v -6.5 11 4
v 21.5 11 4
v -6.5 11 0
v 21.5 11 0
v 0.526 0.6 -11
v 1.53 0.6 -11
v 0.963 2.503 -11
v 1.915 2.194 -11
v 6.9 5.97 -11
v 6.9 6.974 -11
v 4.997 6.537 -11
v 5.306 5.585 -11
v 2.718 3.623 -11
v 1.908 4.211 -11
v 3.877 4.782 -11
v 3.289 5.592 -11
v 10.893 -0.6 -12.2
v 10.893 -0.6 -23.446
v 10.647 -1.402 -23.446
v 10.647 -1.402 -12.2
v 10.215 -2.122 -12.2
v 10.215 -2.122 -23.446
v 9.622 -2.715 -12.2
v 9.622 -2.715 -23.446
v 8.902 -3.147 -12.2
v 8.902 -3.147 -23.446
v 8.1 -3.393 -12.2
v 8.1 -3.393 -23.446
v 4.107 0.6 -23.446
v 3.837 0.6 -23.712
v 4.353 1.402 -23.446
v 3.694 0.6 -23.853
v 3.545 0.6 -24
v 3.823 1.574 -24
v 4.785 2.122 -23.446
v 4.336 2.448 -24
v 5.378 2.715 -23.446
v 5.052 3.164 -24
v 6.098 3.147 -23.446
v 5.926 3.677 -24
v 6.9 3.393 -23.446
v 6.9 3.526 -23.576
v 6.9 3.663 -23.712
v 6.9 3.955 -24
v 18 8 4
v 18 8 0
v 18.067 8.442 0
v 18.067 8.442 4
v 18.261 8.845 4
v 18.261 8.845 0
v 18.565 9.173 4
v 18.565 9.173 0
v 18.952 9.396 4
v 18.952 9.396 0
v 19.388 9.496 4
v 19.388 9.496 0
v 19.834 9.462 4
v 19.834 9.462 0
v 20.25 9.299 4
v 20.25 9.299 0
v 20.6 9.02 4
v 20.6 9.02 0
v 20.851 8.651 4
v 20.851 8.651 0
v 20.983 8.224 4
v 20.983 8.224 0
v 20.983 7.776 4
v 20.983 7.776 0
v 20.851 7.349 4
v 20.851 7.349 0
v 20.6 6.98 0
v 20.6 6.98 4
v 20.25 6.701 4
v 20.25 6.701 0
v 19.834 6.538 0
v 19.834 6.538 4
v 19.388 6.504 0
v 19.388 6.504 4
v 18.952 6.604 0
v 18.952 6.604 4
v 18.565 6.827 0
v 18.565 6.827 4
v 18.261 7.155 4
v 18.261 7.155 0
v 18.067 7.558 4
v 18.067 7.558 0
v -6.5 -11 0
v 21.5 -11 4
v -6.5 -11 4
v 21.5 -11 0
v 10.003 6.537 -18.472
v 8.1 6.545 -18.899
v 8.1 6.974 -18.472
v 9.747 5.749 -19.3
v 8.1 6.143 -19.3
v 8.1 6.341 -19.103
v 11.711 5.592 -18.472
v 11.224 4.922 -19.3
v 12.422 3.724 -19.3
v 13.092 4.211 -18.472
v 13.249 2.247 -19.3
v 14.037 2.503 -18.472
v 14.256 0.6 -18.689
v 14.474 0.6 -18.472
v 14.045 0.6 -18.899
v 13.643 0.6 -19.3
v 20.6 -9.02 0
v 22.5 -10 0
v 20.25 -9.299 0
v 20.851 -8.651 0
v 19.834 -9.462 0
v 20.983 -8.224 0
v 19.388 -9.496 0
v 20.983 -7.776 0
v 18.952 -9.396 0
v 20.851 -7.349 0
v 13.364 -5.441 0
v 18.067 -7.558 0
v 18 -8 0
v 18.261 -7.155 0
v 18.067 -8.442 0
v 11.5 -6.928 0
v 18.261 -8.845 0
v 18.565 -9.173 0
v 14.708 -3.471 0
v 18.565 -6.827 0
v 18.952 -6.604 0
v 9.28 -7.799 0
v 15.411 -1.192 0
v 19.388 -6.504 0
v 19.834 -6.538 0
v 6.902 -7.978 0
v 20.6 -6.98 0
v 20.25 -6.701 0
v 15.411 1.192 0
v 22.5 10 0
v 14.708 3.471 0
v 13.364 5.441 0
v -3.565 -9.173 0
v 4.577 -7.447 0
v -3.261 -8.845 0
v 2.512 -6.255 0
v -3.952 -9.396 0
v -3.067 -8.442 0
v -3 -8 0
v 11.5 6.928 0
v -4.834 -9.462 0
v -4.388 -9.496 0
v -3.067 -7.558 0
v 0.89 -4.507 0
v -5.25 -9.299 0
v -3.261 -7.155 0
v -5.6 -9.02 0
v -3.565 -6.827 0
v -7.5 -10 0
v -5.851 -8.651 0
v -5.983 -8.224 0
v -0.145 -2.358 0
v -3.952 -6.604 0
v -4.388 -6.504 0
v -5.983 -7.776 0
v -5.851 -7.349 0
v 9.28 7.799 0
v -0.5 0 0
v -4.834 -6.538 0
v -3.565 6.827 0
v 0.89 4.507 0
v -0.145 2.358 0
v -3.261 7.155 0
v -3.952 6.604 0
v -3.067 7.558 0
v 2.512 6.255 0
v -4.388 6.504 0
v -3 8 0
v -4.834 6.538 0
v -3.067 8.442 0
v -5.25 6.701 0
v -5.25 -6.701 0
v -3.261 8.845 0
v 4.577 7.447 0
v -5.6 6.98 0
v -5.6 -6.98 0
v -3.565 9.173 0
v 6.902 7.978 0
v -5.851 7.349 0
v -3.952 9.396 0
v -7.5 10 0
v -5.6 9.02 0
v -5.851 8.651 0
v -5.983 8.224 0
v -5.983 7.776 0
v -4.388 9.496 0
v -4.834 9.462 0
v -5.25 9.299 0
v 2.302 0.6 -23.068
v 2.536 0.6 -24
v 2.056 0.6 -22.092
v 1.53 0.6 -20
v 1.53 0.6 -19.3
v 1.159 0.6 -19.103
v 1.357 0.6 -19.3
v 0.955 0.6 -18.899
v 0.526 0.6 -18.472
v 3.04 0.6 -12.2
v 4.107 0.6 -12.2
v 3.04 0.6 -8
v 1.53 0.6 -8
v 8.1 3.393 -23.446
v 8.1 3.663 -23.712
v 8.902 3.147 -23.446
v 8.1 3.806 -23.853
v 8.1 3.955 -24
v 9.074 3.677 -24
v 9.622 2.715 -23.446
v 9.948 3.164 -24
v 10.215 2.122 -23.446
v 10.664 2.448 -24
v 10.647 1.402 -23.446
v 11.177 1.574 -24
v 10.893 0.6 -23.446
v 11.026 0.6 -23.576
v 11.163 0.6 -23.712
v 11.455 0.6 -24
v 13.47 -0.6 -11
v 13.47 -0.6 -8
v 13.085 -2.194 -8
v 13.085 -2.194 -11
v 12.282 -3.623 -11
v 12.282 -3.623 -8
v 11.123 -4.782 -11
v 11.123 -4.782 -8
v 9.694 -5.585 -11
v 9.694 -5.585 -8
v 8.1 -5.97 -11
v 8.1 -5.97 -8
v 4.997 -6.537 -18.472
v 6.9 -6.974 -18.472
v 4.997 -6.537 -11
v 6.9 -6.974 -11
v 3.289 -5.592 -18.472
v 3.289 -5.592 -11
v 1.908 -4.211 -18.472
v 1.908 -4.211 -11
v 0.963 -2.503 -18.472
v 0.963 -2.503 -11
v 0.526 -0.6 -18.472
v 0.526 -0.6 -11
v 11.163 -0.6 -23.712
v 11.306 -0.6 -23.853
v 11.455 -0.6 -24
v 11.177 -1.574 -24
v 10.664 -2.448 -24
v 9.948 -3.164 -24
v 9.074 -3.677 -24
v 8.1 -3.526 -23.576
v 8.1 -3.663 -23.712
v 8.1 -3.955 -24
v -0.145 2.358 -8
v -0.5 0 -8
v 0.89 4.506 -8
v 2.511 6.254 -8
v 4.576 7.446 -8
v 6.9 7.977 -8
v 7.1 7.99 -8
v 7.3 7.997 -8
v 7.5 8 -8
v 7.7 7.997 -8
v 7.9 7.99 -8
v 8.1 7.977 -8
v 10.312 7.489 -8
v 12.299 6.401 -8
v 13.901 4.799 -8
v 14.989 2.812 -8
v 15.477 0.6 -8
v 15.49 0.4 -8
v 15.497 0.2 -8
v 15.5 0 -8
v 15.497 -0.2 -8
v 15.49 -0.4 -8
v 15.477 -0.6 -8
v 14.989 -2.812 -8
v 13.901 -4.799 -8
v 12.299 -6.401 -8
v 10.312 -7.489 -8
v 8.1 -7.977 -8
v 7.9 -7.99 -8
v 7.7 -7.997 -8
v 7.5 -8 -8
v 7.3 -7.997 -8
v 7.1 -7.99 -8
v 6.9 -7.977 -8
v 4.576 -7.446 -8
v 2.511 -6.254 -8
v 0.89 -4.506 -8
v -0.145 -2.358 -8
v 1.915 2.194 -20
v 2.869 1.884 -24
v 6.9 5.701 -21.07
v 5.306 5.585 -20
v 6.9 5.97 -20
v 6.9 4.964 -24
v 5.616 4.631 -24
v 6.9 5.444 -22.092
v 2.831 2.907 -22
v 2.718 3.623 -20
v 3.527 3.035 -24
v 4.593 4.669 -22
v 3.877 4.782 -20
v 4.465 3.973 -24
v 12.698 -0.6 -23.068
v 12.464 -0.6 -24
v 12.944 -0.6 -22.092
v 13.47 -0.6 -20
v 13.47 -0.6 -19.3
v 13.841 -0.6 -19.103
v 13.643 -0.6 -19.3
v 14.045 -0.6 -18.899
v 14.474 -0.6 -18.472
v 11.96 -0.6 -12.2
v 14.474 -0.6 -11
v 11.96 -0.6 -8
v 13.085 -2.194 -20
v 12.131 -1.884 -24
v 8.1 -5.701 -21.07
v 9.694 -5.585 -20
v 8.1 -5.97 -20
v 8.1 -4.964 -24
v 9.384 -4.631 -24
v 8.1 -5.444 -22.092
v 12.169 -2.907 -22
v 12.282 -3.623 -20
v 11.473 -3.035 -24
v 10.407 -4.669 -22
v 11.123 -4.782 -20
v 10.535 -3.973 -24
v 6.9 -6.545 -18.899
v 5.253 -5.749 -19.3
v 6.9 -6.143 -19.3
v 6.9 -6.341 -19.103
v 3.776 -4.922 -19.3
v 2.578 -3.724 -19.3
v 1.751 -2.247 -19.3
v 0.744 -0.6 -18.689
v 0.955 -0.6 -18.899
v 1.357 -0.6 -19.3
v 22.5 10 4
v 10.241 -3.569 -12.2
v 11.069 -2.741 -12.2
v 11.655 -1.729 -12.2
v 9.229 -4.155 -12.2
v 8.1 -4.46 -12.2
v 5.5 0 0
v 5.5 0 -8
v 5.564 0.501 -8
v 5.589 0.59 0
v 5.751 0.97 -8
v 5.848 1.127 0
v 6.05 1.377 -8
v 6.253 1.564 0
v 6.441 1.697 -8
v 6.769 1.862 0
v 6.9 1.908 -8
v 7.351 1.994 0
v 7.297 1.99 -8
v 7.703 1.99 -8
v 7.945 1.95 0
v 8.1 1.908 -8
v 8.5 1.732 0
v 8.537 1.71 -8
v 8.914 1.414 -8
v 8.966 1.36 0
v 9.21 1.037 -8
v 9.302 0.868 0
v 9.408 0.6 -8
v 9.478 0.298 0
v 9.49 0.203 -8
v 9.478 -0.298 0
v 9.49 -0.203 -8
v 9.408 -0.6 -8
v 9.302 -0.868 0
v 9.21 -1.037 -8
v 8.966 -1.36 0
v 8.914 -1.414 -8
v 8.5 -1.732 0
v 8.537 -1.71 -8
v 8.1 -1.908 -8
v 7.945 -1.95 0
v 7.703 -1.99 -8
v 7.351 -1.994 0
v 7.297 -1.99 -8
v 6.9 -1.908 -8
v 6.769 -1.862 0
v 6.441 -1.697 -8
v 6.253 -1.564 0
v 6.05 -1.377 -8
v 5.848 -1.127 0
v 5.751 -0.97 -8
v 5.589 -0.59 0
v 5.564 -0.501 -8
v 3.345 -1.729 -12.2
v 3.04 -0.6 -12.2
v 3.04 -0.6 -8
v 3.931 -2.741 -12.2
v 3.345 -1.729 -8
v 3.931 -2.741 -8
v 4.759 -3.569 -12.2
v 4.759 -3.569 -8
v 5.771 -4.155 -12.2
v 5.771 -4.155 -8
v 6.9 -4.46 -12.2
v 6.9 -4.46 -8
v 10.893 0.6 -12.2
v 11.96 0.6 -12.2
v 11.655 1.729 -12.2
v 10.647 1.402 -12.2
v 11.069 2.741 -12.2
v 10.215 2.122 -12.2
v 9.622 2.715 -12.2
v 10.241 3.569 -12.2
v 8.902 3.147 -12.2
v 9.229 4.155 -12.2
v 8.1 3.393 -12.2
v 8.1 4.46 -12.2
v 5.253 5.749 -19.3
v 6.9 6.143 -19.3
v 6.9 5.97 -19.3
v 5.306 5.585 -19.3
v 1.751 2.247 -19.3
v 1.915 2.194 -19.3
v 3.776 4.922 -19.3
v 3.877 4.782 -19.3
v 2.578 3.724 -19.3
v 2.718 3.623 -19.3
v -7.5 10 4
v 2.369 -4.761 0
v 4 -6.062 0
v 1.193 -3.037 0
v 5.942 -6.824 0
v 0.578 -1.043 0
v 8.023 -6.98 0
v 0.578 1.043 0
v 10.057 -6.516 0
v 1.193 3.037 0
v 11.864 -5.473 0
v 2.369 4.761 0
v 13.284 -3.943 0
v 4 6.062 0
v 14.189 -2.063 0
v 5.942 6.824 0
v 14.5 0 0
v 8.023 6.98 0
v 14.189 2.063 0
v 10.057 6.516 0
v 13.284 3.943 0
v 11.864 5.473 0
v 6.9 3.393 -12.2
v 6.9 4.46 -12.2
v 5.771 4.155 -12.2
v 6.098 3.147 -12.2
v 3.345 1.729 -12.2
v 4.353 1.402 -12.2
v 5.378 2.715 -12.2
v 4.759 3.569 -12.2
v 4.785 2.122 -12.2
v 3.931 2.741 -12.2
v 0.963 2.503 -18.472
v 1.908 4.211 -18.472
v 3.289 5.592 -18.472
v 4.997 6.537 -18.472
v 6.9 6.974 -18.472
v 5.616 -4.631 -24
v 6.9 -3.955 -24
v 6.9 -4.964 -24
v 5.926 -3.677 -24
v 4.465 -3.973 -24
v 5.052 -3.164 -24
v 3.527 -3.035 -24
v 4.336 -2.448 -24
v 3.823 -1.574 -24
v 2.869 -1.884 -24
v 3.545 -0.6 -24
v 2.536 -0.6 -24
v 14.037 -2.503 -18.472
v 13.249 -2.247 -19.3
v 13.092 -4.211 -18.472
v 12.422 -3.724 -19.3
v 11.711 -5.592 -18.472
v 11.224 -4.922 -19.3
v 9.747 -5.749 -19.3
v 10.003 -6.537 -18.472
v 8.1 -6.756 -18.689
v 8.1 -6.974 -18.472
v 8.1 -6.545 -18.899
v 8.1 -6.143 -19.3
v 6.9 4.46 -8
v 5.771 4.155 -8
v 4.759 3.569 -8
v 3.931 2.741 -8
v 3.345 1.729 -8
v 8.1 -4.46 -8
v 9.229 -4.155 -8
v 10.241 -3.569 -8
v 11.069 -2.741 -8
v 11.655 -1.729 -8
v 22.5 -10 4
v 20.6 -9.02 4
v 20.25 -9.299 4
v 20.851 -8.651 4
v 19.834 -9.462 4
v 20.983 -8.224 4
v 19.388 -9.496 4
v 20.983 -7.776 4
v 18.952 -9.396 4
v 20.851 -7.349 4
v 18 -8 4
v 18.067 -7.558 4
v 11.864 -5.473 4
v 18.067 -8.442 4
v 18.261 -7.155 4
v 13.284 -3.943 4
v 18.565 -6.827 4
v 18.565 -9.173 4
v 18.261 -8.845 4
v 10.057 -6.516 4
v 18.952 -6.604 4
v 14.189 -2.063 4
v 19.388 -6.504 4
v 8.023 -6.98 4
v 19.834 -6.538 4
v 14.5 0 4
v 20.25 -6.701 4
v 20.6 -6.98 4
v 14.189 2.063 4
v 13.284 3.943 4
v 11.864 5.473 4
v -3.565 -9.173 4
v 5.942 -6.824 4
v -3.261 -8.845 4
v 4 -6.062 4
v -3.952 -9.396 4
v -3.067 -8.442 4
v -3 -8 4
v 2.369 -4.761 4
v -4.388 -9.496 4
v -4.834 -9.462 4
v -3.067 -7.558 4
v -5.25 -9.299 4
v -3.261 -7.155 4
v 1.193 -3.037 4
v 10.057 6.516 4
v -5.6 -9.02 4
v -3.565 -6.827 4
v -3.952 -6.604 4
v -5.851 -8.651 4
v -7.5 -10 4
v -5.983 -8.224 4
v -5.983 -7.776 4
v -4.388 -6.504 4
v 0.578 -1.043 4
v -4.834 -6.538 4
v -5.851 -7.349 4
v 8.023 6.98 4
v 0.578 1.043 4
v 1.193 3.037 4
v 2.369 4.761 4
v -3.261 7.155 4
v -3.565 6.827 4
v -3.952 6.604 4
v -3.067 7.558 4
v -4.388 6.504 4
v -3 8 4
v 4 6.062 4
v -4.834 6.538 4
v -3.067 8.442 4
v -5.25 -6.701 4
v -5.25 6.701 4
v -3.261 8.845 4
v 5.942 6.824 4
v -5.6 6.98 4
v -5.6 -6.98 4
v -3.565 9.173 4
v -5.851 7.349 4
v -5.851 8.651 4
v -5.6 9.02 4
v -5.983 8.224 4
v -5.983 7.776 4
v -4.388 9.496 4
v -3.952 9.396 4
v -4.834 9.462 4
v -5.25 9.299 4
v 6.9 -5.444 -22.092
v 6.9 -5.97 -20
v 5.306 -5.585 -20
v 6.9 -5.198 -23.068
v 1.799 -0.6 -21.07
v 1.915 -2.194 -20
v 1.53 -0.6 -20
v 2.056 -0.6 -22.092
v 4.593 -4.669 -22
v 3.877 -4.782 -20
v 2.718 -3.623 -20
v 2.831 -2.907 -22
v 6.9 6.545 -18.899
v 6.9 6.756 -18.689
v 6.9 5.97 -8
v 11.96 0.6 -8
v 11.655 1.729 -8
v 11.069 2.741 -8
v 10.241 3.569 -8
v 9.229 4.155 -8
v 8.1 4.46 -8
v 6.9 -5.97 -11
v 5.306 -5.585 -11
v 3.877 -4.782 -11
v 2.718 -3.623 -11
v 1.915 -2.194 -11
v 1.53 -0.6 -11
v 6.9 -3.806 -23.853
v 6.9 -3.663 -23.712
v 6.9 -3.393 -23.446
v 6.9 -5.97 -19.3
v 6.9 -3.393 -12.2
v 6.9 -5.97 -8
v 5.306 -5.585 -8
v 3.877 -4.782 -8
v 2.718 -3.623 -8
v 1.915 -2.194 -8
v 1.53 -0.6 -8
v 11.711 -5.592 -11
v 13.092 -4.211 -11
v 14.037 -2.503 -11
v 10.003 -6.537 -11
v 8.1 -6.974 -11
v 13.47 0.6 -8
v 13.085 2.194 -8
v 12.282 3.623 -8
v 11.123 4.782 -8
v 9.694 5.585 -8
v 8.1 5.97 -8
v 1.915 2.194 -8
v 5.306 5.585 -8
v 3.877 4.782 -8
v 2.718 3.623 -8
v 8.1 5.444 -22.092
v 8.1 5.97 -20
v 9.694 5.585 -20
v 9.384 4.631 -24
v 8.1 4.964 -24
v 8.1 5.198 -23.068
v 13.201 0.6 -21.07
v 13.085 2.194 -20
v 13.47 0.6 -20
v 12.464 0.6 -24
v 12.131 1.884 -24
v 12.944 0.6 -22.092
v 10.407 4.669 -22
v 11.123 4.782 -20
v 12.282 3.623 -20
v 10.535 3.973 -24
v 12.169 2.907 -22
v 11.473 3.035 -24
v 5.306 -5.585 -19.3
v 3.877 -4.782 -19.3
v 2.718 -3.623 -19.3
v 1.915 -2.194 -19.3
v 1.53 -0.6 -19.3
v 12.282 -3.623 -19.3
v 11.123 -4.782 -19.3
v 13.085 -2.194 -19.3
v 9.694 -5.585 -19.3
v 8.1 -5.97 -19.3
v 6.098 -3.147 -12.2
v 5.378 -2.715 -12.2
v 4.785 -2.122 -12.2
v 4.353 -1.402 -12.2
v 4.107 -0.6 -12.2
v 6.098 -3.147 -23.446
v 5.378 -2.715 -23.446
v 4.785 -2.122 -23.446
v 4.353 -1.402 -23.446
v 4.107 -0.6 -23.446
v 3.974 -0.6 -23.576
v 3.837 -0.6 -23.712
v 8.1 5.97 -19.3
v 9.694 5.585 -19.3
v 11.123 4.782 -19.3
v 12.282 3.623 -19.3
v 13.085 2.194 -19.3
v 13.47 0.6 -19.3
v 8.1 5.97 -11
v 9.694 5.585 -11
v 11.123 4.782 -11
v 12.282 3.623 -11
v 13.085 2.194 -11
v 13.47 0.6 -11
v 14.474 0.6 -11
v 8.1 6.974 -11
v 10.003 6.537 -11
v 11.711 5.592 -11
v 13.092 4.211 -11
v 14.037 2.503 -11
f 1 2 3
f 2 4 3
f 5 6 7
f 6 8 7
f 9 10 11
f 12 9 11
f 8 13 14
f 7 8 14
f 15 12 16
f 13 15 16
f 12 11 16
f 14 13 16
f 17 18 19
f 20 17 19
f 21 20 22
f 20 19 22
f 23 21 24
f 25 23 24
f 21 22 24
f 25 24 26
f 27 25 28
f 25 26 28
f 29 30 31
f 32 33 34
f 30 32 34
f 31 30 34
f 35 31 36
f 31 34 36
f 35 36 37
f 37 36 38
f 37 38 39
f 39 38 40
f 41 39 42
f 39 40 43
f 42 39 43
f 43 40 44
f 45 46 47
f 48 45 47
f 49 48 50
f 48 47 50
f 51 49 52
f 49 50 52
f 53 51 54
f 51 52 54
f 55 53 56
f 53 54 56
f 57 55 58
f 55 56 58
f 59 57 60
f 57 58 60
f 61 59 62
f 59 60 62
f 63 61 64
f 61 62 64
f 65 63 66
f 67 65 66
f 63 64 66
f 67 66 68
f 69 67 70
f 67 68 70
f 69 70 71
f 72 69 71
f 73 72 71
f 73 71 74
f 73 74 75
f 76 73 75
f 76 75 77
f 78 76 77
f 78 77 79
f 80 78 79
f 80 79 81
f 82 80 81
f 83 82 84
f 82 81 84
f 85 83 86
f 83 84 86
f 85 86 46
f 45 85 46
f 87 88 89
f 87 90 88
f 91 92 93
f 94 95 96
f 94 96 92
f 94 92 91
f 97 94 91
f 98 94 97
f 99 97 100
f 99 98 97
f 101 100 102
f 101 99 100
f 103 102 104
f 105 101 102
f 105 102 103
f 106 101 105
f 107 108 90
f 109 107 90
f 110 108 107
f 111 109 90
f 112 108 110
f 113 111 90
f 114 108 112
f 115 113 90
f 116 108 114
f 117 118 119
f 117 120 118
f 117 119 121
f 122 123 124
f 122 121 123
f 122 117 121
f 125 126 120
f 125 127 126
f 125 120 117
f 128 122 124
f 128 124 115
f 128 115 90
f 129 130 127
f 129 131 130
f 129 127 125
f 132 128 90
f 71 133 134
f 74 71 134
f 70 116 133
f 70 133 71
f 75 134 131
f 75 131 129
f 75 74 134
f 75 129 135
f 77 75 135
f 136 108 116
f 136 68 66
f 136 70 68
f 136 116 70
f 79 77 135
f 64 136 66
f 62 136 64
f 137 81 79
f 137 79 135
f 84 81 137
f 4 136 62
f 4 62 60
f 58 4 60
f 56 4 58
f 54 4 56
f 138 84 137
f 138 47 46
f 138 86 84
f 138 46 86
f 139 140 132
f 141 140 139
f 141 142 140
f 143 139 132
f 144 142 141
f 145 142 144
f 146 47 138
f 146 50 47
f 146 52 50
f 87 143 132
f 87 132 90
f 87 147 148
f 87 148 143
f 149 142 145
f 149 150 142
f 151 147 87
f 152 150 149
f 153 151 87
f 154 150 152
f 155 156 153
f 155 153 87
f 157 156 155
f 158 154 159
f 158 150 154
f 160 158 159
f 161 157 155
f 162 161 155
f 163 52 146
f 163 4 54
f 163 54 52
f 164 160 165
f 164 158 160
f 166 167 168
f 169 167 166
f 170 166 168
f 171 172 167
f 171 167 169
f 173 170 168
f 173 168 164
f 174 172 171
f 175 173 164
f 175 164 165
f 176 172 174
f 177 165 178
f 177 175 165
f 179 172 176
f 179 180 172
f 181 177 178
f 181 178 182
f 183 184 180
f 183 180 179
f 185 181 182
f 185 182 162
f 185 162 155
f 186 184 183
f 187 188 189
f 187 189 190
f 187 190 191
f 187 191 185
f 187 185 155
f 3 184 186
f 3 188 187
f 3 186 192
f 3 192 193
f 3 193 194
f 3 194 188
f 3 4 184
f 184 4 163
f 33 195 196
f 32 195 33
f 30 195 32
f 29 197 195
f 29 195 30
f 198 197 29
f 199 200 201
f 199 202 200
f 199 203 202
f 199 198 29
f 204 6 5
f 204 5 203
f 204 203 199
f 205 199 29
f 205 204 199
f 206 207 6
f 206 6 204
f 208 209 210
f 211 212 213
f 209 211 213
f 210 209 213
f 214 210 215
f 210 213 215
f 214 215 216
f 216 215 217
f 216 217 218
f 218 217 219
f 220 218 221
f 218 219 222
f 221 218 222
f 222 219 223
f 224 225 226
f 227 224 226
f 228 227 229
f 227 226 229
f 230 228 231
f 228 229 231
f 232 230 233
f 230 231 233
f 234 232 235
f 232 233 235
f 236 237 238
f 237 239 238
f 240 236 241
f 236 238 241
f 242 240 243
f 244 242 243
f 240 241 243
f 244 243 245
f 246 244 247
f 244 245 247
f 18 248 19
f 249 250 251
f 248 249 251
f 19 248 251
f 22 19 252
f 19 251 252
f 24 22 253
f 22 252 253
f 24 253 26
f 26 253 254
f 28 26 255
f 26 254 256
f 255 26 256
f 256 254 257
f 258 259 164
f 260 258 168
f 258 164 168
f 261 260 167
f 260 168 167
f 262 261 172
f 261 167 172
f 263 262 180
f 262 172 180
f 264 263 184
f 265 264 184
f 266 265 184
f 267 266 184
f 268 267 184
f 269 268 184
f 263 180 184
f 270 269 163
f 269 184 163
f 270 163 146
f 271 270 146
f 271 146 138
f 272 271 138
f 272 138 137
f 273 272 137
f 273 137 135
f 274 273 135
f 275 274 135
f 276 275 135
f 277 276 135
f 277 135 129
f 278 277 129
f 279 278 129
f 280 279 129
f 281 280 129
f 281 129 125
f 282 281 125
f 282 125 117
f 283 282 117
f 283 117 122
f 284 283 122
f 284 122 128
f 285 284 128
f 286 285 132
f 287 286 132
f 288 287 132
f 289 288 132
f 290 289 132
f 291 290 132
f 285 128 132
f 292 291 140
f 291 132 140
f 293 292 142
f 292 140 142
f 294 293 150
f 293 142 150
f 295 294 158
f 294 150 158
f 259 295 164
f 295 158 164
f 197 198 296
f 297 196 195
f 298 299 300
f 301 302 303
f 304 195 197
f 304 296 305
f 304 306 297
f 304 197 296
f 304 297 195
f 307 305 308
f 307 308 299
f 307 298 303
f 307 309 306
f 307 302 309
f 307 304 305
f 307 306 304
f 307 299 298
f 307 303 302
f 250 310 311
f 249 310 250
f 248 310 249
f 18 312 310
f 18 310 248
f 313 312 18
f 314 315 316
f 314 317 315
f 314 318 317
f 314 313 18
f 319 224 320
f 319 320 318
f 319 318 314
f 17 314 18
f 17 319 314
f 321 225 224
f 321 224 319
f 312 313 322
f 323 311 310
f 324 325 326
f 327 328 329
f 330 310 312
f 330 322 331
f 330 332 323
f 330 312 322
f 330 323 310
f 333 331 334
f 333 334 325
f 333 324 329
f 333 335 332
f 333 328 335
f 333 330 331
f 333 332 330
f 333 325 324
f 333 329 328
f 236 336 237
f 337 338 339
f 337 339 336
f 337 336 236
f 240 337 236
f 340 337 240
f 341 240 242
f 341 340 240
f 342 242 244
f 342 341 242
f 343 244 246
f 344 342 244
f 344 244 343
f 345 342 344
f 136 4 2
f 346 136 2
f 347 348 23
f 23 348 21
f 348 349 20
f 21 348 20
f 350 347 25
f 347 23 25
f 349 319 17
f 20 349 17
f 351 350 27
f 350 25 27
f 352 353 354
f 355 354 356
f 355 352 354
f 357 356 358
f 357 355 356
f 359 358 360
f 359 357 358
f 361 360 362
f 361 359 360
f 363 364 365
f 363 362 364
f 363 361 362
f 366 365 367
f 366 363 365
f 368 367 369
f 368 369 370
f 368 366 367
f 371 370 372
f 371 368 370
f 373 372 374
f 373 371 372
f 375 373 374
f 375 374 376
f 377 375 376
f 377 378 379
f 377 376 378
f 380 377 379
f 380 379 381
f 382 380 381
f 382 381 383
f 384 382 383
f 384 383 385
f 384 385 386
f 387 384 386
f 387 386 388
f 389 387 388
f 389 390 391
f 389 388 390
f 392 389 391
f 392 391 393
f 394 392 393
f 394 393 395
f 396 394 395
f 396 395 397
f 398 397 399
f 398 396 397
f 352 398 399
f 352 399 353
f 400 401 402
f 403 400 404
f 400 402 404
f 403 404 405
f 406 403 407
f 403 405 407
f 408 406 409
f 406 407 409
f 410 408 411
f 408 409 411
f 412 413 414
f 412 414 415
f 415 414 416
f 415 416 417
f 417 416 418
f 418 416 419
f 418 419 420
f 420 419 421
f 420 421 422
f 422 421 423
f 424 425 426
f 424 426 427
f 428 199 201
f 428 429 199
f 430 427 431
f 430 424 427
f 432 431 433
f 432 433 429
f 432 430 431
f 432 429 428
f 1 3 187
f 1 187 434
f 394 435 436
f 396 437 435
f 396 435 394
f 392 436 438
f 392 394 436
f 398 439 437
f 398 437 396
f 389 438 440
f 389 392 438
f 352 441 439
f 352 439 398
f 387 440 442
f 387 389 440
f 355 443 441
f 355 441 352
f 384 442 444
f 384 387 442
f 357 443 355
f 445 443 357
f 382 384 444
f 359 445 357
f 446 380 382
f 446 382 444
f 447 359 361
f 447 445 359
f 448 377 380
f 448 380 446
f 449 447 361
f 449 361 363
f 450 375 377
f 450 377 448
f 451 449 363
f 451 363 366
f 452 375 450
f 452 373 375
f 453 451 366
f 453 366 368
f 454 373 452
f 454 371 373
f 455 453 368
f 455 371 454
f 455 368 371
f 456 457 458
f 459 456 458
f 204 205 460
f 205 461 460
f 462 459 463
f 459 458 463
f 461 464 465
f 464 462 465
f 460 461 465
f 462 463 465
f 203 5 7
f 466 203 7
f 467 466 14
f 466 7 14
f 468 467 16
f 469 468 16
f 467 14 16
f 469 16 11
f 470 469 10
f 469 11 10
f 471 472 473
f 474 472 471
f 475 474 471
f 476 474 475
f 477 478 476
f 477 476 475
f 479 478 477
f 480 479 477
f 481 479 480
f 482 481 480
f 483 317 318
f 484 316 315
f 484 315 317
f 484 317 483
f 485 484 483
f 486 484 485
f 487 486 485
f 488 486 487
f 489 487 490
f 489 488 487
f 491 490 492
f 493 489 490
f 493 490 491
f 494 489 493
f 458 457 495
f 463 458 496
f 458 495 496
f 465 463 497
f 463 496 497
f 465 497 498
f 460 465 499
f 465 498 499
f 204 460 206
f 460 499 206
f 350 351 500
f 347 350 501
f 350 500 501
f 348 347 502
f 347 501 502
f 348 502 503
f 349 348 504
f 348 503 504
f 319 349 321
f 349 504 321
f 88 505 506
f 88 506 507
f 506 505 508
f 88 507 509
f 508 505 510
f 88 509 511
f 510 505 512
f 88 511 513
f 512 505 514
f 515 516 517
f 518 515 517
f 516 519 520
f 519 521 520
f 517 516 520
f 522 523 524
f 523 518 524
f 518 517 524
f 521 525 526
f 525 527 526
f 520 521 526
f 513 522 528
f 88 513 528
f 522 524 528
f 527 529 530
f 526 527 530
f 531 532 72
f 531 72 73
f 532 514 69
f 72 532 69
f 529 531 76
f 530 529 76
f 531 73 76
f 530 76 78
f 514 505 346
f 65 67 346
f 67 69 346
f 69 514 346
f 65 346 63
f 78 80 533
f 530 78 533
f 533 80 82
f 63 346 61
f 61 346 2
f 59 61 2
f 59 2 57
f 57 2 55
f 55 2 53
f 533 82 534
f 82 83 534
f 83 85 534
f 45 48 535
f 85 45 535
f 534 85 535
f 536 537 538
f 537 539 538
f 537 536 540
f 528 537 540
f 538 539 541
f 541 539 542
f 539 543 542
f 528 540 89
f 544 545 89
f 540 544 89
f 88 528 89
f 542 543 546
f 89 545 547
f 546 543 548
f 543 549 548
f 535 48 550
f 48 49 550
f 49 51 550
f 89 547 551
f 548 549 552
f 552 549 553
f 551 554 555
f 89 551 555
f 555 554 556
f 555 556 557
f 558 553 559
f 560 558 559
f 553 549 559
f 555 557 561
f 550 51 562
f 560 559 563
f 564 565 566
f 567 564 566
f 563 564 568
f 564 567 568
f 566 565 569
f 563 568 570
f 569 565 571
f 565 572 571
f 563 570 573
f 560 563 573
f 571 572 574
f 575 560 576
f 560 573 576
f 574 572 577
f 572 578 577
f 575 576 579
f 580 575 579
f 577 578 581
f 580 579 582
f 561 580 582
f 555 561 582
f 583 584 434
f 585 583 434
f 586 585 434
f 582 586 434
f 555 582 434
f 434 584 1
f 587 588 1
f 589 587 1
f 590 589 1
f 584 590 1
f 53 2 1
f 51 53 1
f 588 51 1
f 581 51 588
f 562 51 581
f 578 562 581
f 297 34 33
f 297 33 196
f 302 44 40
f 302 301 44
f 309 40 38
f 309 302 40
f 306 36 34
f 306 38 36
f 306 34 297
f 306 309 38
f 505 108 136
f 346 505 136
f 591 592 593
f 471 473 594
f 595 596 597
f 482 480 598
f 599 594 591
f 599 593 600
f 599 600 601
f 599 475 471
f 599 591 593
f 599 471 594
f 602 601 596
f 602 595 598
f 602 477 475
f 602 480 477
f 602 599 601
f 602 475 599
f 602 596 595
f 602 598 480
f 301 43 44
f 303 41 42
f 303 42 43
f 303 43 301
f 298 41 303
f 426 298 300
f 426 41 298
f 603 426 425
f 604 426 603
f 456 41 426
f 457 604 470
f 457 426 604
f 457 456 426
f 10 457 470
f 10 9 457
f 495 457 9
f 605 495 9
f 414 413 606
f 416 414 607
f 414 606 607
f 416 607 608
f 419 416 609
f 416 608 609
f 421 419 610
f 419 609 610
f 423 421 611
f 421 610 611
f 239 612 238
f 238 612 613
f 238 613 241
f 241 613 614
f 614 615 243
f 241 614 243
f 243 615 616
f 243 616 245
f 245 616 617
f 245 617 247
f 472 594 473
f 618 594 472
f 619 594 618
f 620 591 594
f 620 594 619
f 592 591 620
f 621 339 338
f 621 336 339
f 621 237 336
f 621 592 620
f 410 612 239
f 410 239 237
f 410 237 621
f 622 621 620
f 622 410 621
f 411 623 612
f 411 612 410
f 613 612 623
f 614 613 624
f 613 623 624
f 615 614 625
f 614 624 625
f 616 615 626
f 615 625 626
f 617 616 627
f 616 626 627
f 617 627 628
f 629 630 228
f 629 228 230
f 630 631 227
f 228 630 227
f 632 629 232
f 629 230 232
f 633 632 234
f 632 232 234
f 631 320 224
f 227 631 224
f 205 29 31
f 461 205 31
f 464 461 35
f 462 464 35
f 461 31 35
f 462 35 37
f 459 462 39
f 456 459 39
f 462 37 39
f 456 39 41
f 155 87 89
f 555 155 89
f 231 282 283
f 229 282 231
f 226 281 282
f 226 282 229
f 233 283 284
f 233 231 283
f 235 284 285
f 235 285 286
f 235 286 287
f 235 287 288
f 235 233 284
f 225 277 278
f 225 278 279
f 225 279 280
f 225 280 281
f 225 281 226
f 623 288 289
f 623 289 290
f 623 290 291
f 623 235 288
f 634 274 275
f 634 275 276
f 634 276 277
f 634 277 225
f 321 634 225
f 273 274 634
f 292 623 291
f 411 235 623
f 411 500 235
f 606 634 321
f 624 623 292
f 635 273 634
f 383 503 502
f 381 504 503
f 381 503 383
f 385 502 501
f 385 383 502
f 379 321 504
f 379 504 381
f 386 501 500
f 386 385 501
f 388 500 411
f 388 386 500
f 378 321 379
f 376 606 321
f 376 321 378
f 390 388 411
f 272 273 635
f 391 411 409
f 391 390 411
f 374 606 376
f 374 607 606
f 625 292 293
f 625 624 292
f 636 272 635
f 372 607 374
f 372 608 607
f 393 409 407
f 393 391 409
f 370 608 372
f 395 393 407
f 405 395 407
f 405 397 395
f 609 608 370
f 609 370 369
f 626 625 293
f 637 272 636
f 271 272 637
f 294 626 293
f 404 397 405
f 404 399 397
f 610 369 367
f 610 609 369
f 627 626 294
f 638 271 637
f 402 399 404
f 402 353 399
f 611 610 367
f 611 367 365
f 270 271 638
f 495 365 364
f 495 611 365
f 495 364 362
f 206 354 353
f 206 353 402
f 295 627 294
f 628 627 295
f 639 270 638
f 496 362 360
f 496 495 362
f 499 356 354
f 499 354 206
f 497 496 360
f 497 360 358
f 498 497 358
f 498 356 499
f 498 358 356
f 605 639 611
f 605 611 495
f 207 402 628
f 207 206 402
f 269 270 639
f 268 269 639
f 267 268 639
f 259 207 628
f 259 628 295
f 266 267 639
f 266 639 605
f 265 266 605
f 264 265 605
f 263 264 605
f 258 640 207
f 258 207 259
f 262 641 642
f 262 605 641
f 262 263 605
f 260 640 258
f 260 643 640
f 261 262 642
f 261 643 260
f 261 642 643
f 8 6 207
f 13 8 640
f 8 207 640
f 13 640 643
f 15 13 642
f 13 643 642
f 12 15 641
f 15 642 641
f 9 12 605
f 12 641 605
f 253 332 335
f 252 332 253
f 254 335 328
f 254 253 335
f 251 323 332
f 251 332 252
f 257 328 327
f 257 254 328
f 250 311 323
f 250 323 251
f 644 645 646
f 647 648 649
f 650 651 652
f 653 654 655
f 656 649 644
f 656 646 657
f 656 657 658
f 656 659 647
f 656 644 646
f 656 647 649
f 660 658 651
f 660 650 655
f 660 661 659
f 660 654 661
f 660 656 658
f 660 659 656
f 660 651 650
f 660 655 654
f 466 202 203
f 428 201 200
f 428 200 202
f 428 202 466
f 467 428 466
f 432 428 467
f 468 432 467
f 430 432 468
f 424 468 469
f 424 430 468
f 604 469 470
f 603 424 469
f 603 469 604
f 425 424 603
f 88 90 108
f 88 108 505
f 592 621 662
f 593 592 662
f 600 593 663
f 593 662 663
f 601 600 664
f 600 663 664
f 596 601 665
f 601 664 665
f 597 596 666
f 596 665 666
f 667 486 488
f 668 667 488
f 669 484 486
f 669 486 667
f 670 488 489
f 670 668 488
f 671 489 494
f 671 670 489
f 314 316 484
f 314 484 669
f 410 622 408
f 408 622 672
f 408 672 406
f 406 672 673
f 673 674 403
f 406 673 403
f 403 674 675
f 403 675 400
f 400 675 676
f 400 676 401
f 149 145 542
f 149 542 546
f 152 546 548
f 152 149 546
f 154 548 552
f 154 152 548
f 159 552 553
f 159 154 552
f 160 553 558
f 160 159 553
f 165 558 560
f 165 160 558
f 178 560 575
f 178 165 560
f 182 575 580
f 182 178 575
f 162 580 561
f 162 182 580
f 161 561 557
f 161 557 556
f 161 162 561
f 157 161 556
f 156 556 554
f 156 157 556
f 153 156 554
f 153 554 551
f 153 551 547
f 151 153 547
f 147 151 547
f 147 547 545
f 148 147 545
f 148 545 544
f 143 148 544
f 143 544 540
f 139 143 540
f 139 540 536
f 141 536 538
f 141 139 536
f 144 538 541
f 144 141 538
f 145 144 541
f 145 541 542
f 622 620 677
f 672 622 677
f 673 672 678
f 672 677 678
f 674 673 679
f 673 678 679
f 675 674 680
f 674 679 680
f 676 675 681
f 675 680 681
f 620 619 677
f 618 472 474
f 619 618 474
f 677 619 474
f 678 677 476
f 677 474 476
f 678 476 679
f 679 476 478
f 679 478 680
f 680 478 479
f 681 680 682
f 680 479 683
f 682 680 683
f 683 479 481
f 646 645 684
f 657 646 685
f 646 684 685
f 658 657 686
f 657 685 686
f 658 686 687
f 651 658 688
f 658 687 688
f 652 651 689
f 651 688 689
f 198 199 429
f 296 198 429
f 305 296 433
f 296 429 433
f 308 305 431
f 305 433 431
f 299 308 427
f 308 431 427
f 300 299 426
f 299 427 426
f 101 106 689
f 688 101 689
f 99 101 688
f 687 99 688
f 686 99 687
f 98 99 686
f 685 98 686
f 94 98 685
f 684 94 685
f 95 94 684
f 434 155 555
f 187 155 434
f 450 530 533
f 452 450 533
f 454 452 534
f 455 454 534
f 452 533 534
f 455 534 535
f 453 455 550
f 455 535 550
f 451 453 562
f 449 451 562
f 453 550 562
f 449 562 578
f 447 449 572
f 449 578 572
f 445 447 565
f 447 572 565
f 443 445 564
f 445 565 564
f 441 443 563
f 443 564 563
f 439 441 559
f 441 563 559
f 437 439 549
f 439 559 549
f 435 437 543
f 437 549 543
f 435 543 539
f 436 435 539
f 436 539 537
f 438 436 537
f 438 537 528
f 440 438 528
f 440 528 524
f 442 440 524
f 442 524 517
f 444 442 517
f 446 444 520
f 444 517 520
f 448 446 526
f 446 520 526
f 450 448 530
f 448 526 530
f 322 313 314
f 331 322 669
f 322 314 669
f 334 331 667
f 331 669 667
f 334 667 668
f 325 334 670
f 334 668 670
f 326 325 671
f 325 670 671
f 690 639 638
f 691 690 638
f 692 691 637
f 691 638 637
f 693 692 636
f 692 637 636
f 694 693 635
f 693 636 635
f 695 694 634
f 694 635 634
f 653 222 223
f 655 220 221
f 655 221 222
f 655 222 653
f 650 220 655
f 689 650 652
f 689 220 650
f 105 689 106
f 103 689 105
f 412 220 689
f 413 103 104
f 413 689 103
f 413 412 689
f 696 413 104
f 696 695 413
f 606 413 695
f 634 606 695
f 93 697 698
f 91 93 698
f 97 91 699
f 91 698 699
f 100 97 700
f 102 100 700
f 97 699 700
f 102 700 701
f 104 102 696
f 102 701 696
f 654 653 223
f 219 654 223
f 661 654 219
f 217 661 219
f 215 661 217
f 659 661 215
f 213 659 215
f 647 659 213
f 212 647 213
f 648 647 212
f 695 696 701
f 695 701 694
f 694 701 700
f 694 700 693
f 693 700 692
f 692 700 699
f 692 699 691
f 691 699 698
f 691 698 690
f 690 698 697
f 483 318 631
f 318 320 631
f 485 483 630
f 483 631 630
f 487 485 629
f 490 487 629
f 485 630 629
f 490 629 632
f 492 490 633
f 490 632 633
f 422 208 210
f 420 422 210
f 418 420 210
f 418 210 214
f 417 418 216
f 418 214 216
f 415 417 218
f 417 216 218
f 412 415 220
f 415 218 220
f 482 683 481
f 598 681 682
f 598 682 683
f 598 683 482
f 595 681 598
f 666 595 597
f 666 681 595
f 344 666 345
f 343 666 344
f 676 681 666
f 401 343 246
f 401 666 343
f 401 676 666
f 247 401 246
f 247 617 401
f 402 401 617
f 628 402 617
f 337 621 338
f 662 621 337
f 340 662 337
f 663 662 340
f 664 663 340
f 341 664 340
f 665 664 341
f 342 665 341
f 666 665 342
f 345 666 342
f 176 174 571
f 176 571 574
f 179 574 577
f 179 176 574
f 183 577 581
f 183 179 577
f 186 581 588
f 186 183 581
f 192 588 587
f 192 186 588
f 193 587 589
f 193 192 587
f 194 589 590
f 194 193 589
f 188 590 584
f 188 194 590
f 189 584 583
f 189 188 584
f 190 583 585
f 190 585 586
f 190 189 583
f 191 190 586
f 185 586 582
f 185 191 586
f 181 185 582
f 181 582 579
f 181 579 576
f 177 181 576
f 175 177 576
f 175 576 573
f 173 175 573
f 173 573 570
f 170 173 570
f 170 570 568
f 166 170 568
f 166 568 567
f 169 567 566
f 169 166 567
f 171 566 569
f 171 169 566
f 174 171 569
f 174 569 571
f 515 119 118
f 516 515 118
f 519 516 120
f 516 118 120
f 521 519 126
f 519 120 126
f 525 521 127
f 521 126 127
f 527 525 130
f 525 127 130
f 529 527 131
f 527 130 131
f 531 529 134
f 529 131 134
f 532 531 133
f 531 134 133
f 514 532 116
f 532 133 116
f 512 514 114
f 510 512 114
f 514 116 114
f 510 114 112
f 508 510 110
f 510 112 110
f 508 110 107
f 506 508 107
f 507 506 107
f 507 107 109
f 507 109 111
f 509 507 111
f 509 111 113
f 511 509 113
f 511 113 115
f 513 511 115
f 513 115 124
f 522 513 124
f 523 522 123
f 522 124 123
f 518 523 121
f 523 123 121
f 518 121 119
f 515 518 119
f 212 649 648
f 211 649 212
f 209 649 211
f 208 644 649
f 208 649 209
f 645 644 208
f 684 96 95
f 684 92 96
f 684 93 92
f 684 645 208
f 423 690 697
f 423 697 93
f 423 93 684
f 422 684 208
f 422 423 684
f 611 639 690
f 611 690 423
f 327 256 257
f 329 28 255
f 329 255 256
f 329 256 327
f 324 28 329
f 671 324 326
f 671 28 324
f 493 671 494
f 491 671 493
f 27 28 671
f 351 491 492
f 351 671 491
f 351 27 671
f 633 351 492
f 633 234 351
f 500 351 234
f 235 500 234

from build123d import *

# Parameters (mm, degrees)
SKETCH_1_W                 = 15
SKETCH_1_H                 = 22
SKETCH_1_R                 = 1.5
EXTRUDE_1_DEPTH            = 4
CHAMFER_1_SIZE             = 1
CHAMFER_1_OF_MIRROR_1_SIZE = 1
SKETCH_2_R                 = 2
CUT_EXTRUDE_1_DEPTH        = 5
SKETCH_3_R                 = 8
SKETCH_3_R_2               = 2
EXTRUDE_2_DEPTH            = 8
EXTRUDE_3_DEPTH            = 16
CHAMFER_2_SIZE             = 4
CHAMFER_2_SIZE2            = 1
EXTRUDE_START              = 3
SKETCH_5_R                 = 7
SKETCH_5_R_2               = 4.5
EXTRUDE_4_DEPTH            = 8.3
CHAMFER_3_SIZE             = 0.828
SKETCH_6_R                 = 4.5
SKETCH_6_R_2               = 3.4455
EXTRUDE_5_DEPTH            = 11.8
CHAMFER_4_SIZE             = 0.5545
CUT_EXTRUDE_3_DEPTH        = 17
SKETCH_7_R                 = 7
CUT_EXTRUDE_4_DEPTH        = 4


with BuildPart() as part:
    # Эскиз1 → Бобышка-Вытянуть1 (new body)
    with BuildSketch(Plane.XY):
        Rectangle(SKETCH_1_W, SKETCH_1_H)
        with Locations((-4.5, 8)):
            Circle(SKETCH_1_R, mode=Mode.SUBTRACT)
        with Locations((-4.5, -8)):
            Circle(SKETCH_1_R, mode=Mode.SUBTRACT)
    extrude_1 = extrude(amount=EXTRUDE_1_DEPTH)

    # Фаска1
    chamfer_1_edges = [part.edges().sort_by_distance(p)[0] for p in [
        (-7.5, -11, 2),
        (-7.5, 11, 2),
    ]]
    chamfer(chamfer_1_edges, length=CHAMFER_1_SIZE)

    # Зеркальное отражение1: Бобышка-Вытянуть1 across plane
    add(extrude_1.mirror(Plane(origin=(7.5, -11, 4), x_dir=(0, 0, 1), z_dir=(-1, 0, 0))))

    # Фаска1 of Зеркальное отражение1
    chamfer_1_of_mirror_1_edges = [part.edges().sort_by_distance(p)[0] for p in [
        (22.5, -11, 2),
        (22.5, 11, 2),
    ]]
    chamfer(chamfer_1_of_mirror_1_edges, length=CHAMFER_1_OF_MIRROR_1_SIZE)

    # Эскиз2 → Вырез-Вытянуть1 (cut, through all)
    with BuildSketch(Plane(origin=(0, 0, 0), x_dir=(-1, 0, 0), z_dir=(0, 0, -1))):
        with Locations((-7.5, 0)):
            Circle(SKETCH_2_R)
    extrude(amount=-CUT_EXTRUDE_1_DEPTH, mode=Mode.SUBTRACT)

    # Эскиз3 → Бобышка-Вытянуть2 (add)
    with BuildSketch(Plane(origin=(0, 0, 0), x_dir=(-1, 0, 0), z_dir=(0, 0, -1))):
        with Locations((-7.5, 0)):
            Circle(SKETCH_3_R)
        with Locations((-7.5, 0)):
            Circle(SKETCH_3_R_2, mode=Mode.SUBTRACT)
    extrude(amount=EXTRUDE_2_DEPTH)

    # Эскиз4 → Бобышка-Вытянуть3 (add)
    with BuildSketch(Plane(origin=(0, 0, -8), x_dir=(-1, 0, 0), z_dir=(0, 0, -1))):
        with BuildLine():
            Line((-8.1, 4.459820624), (-8.1, 5.969924623))
            ThreePointArc((-8.1, 5.969924623), (-11.742640687, 4.242640687), (-13.469924623, 0.6))
            Line((-13.469924623, 0.6), (-11.959820624, 0.6))
            ThreePointArc((-11.959820624, 0.6), (-10.681980515, 3.181980515), (-8.1, 4.459820624))
        make_face()
        with BuildLine():
            Line((-6.9, 4.459820624), (-6.9, 5.969924623))
            ThreePointArc((-6.9, 5.969924623), (-7.5, 6), (-8.1, 5.969924623))
            Line((-8.1, 5.969924623), (-8.1, 4.459820624))
            ThreePointArc((-8.1, 4.459820624), (-7.5, 4.5), (-6.9, 4.459820624))
        make_face()
        with BuildLine():
            ThreePointArc((-8.1, -5.969924623), (-7.5, -6), (-6.9, -5.969924623))
            Line((-6.9, -5.969924623), (-6.9, -4.459820624))
            ThreePointArc((-6.9, -4.459820624), (-7.5, -4.5), (-8.1, -4.459820624))
            Line((-8.1, -4.459820624), (-8.1, -5.969924623))
        make_face()
        with BuildLine():
            Line((-3.040179376, 0.6), (-1.530075377, 0.6))
            ThreePointArc((-1.530075377, 0.6), (-3.257359313, 4.242640687), (-6.9, 5.969924623))
            Line((-6.9, 5.969924623), (-6.9, 4.459820624))
            ThreePointArc((-6.9, 4.459820624), (-4.318019485, 3.181980515), (-3.040179376, 0.6))
        make_face()
        with BuildLine():
            ThreePointArc((-1.5, 0), (-1.507523561, 0.30037665), (-1.530075377, 0.6))
            Line((-1.530075377, 0.6), (-3.040179376, 0.6))
            ThreePointArc((-3.040179376, 0.6), (-3.01005608, 0.300671907), (-3, 0))
            ThreePointArc((-3, 0), (-3.01005608, -0.300671907), (-3.040179376, -0.6))
            Line((-3.040179376, -0.6), (-1.530075377, -0.6))
            ThreePointArc((-1.530075377, -0.6), (-1.507523561, -0.30037665), (-1.5, 0))
        make_face()
        with BuildLine():
            Line((-11.959820624, 0.6), (-13.469924623, 0.6))
            ThreePointArc((-13.469924623, 0.6), (-13.5, 0), (-13.469924623, -0.6))
            Line((-13.469924623, -0.6), (-11.959820624, -0.6))
            ThreePointArc((-11.959820624, -0.6), (-12, 0), (-11.959820624, 0.6))
        make_face()
        with BuildLine():
            ThreePointArc((-6.9, -5.969924623), (-3.257359313, -4.242640687), (-1.530075377, -0.6))
            Line((-1.530075377, -0.6), (-3.040179376, -0.6))
            ThreePointArc((-3.040179376, -0.6), (-4.318019485, -3.181980515), (-6.9, -4.459820624))
            Line((-6.9, -4.459820624), (-6.9, -5.969924623))
        make_face()
        with BuildLine():
            ThreePointArc((-13.469924623, -0.6), (-11.742640687, -4.242640687), (-8.1, -5.969924623))
            Line((-8.1, -5.969924623), (-8.1, -4.459820624))
            ThreePointArc((-8.1, -4.459820624), (-10.681980515, -3.181980515), (-11.959820624, -0.6))
            Line((-11.959820624, -0.6), (-13.469924623, -0.6))
        make_face()
    extrude(amount=EXTRUDE_3_DEPTH)

    # Фаска2
    chamfer_2_edges = [part.edges().sort_by_distance(p)[0] for p in [
        (2.854361747, 3.797110115, -24),
    ]]
    chamfer_2_side = [part.faces().sort_by_distance(p)[0] for p in [
        (2.854361747, 3.797110115, -16),
    ]]
    chamfer(chamfer_2_edges, length=CHAMFER_2_SIZE, length2=CHAMFER_2_SIZE2, reference=chamfer_2_side[0])

    # Эскиз5 → Бобышка-Вытянуть4 (add)
    with BuildSketch(Plane(origin=(0, 0, -8), x_dir=(-1, 0, 0), z_dir=(0, 0, -1)).offset(EXTRUDE_START)):
        with Locations((-7.5, 0)):
            Circle(SKETCH_5_R)
        with Locations((-7.5, 0)):
            Circle(SKETCH_5_R_2, mode=Mode.SUBTRACT)
    extrude(amount=EXTRUDE_4_DEPTH)

    # Фаска3
    chamfer_3_edges = [part.edges().sort_by_distance(p)[0] for p in [
        (14.5, 0, -19.3),
    ]]
    chamfer(chamfer_3_edges, length=CHAMFER_3_SIZE)

    # Эскиз6 → Бобышка-Вытянуть5 (add)
    with BuildSketch(Plane(origin=(0, 0, -24), x_dir=(-1, 0, 0), z_dir=(0, 0, -1))):
        with Locations((-7.5, 0)):
            Circle(SKETCH_6_R)
        with Locations((-7.5, 0)):
            Circle(SKETCH_6_R_2, mode=Mode.SUBTRACT)
    extrude(amount=-EXTRUDE_5_DEPTH)

    # Фаска4
    chamfer_4_edges = [part.edges().sort_by_distance(p)[0] for p in [
        (10.9455, 0, -24),
    ]]
    chamfer(chamfer_4_edges, length=CHAMFER_4_SIZE)

    # Эскиз4<4> → Вырез-Вытянуть3 (cut, through all)
    with BuildSketch(Plane(origin=(0, 0, -8), x_dir=(-1, 0, 0), z_dir=(0, 0, -1))):
        with BuildLine():
            Line((-6.9, 5.969924623), (-6.9, 7.97746827))
            ThreePointArc((-6.9, 7.97746827), (-7.199788542, 7.994365083), (-7.5, 8))
            ThreePointArc((-7.5, 8), (-7.800211458, 7.994365083), (-8.1, 7.97746827))
            Line((-8.1, 7.97746827), (-8.1, 5.969924623))
            ThreePointArc((-8.1, 5.969924623), (-7.5, 6), (-6.9, 5.969924623))
        make_face()
        with BuildLine():
            ThreePointArc((-7.5, -8), (-7.199788542, -7.994365083), (-6.9, -7.97746827))
            Line((-6.9, -7.97746827), (-6.9, -5.969924623))
            ThreePointArc((-6.9, -5.969924623), (-7.5, -6), (-8.1, -5.969924623))
            Line((-8.1, -5.969924623), (-8.1, -7.97746827))
            ThreePointArc((-8.1, -7.97746827), (-7.800211458, -7.994365083), (-7.5, -8))
        make_face()
        with BuildLine():
            Line((-6.9, 4.459820624), (-6.9, 5.969924623))
            ThreePointArc((-6.9, 5.969924623), (-7.5, 6), (-8.1, 5.969924623))
            Line((-8.1, 5.969924623), (-8.1, 4.459820624))
            ThreePointArc((-8.1, 4.459820624), (-7.5, 4.5), (-6.9, 4.459820624))
        make_face()
        with BuildLine():
            ThreePointArc((-8.1, -5.969924623), (-7.5, -6), (-6.9, -5.969924623))
            Line((-6.9, -5.969924623), (-6.9, -4.459820624))
            ThreePointArc((-6.9, -4.459820624), (-7.5, -4.5), (-8.1, -4.459820624))
            Line((-8.1, -4.459820624), (-8.1, -5.969924623))
        make_face()
        with BuildLine():
            Line((-6.9, 1.907878403), (-6.9, 4.459820624))
            ThreePointArc((-6.9, 4.459820624), (-7.5, 4.5), (-8.1, 4.459820624))
            Line((-8.1, 4.459820624), (-8.1, 1.907878403))
            ThreePointArc((-8.1, 1.907878403), (-7.5, 2), (-6.9, 1.907878403))
        make_face()
        with BuildLine():
            ThreePointArc((-8.1, -4.459820624), (-7.5, -4.5), (-6.9, -4.459820624))
            Line((-6.9, -4.459820624), (-6.9, -1.907878403))
            ThreePointArc((-6.9, -1.907878403), (-7.5, -2), (-8.1, -1.907878403))
            Line((-8.1, -1.907878403), (-8.1, -4.459820624))
        make_face()
        with BuildLine():
            ThreePointArc((0.5, 0), (0.494365083, 0.300211458), (0.47746827, 0.6))
            Line((0.47746827, 0.6), (-1.530075377, 0.6))
            ThreePointArc((-1.530075377, 0.6), (-1.507523561, 0.30037665), (-1.5, 0))
            ThreePointArc((-1.5, 0), (-1.507523561, -0.30037665), (-1.530075377, -0.6))
            Line((-1.530075377, -0.6), (0.47746827, -0.6))
            ThreePointArc((0.47746827, -0.6), (0.494365083, -0.300211458), (0.5, 0))
        make_face()
        with BuildLine():
            ThreePointArc((-13.469924623, -0.6), (-13.5, 0), (-13.469924623, 0.6))
            Line((-13.469924623, 0.6), (-15.47746827, 0.6))
            ThreePointArc((-15.47746827, 0.6), (-15.494365083, 0.300211458), (-15.5, 0))
            ThreePointArc((-15.5, 0), (-15.494365083, -0.300211458), (-15.47746827, -0.6))
            Line((-15.47746827, -0.6), (-13.469924623, -0.6))
        make_face()
        with BuildLine():
            ThreePointArc((-1.5, 0), (-1.507523561, 0.30037665), (-1.530075377, 0.6))
            Line((-1.530075377, 0.6), (-3.040179376, 0.6))
            ThreePointArc((-3.040179376, 0.6), (-3.01005608, 0.300671907), (-3, 0))
            ThreePointArc((-3, 0), (-3.01005608, -0.300671907), (-3.040179376, -0.6))
            Line((-3.040179376, -0.6), (-1.530075377, -0.6))
            ThreePointArc((-1.530075377, -0.6), (-1.507523561, -0.30037665), (-1.5, 0))
        make_face()
        with BuildLine():
            Line((-11.959820624, 0.6), (-13.469924623, 0.6))
            ThreePointArc((-13.469924623, 0.6), (-13.5, 0), (-13.469924623, -0.6))
            Line((-13.469924623, -0.6), (-11.959820624, -0.6))
            ThreePointArc((-11.959820624, -0.6), (-12, 0), (-11.959820624, 0.6))
        make_face()
        with BuildLine():
            ThreePointArc((-3, 0), (-3.01005608, 0.300671907), (-3.040179376, 0.6))
            Line((-3.040179376, 0.6), (-5.592121597, 0.6))
            ThreePointArc((-5.592121597, 0.6), (-5.523164548, 0.303515399), (-5.5, 0))
            ThreePointArc((-5.5, 0), (-5.523164548, -0.303515399), (-5.592121597, -0.6))
            Line((-5.592121597, -0.6), (-3.040179376, -0.6))
            ThreePointArc((-3.040179376, -0.6), (-3.01005608, -0.300671907), (-3, 0))
        make_face()
        with BuildLine():
            Line((-9.407878403, 0.6), (-11.959820624, 0.6))
            ThreePointArc((-11.959820624, 0.6), (-12, 0), (-11.959820624, -0.6))
            Line((-11.959820624, -0.6), (-9.407878403, -0.6))
            ThreePointArc((-9.407878403, -0.6), (-9.5, 0), (-9.407878403, 0.6))
        make_face()
    extrude(amount=CUT_EXTRUDE_3_DEPTH, mode=Mode.SUBTRACT)

    # Эскиз7 → Вырез-Вытянуть4 (cut)
    with BuildSketch(Plane.XY.offset(4)):
        with Locations((7.5, 0)):
            Circle(SKETCH_7_R)
    extrude(amount=-CUT_EXTRUDE_4_DEPTH, mode=Mode.SUBTRACT)


solid = part.part
